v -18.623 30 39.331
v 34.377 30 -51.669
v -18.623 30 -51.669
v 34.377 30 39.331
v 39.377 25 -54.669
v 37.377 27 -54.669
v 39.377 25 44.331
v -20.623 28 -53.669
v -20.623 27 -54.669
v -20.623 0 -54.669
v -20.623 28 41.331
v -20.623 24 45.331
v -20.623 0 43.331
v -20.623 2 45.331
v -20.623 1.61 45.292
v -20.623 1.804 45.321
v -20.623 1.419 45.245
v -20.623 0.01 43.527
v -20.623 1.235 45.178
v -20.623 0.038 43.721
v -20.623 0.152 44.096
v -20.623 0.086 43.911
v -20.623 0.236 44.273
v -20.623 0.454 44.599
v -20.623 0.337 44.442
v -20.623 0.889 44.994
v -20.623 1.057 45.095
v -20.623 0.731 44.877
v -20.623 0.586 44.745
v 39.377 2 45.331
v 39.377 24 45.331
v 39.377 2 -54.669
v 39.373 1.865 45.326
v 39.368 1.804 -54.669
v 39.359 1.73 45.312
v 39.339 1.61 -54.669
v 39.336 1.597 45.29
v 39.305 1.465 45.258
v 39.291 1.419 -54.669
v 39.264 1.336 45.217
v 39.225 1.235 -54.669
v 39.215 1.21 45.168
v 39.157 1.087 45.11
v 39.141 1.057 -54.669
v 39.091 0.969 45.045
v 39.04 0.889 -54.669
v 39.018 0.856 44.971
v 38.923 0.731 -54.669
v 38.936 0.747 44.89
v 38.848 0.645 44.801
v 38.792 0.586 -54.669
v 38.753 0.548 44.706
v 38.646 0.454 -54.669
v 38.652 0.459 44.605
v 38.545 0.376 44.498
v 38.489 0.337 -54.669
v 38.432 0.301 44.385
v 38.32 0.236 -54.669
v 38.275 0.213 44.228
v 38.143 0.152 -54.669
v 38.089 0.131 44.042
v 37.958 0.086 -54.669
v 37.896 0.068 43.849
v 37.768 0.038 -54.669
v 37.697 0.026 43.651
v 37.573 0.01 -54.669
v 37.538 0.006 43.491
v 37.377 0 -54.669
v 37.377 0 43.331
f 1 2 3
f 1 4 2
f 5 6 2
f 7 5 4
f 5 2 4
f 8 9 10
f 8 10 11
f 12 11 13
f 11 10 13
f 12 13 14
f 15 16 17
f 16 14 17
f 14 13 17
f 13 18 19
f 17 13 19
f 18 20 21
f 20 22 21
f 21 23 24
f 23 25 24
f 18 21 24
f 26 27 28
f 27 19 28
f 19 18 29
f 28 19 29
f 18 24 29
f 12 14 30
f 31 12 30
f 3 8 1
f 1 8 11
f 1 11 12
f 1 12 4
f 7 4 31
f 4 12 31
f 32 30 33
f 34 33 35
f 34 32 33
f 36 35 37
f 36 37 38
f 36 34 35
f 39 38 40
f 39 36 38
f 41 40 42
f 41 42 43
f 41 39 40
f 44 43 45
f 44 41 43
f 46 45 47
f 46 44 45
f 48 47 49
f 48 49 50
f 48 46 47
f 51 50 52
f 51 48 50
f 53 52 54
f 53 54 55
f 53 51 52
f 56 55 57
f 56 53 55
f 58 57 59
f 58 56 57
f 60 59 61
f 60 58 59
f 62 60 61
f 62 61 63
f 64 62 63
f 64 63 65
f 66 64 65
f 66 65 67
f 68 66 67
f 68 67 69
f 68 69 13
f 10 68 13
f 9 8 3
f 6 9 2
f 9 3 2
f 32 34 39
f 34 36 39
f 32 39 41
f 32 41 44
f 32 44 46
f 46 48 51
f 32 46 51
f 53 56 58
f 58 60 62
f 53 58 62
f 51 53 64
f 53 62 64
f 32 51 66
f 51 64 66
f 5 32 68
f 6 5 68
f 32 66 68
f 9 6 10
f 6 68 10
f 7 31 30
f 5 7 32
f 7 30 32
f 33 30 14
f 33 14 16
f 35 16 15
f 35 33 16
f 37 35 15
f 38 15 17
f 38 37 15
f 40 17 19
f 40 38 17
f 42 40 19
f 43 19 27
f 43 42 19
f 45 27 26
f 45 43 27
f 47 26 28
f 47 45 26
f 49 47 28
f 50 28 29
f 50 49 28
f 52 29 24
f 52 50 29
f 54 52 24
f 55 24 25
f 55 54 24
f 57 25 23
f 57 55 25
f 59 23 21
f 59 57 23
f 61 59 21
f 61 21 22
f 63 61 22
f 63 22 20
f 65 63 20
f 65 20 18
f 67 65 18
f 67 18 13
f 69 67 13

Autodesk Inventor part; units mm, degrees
ref_plane "YZ Plane" through (0, 0, 0) normal (1, 0, 0) x (0, 1, 0)
ref_plane "XZ Plane" through (0, 0, 0) normal (0, 1, 0) x (-1, 0, 0)
ref_plane "XY Plane" through (0, 0, 0) normal (0, 0, 1) x (1, 0, 0)
sketch "Sketch1" plane through (0, 0, 0) normal (0, 1, 0) x (-1, 0, 0)
  line L0 (20.6226, 45.3307) -> (-39.3774, 45.3307)
  line L1 (-39.3774, 45.3307) -> (-39.3774, -54.6693)
  line L2 (-39.3774, -54.6693) -> (20.6226, -54.6693)
  line L3 (20.6226, -54.6693) -> (20.6226, 45.3307)
  point P0 (0, 0)
  dimension "d0" = 100
  dimension "d1" = 60
extrude "Extrusion1" add sketch "Sketch1" along normal blind 30
chamfer "Chamfer1" distance 5 angle 45 1 edges at (39.3774, 30, -4.6693)
chamfer "Chamfer2" distance 6 angle 45 1 edges at (6.8774, 30, 45.3307)
chamfer "Chamfer3" distance 3 angle 45 1 edges at (6.8774, 30, -54.6693)
chamfer "Chamfer4" distance 2 angle 45 1 edges at (-20.6226, 30, -6.1693)
fillet "Fillet1" radius 2 2 edges at (39.3774, 0, -4.6693) (9.3774, 0, 45.3307)
sketch "Sketch2" plane through (0, 30, 0) normal (0, 1, 0) x (1, 0, 0)
  line L0 (34.3774, 51.6693) -> (34.3774, -39.3307) projected
  line L1 (-18.6226, -39.3307) -> (-18.6226, 51.6693) projected
  line L2 (34.3774, -39.3307) -> (-18.6226, -39.3307) projected
  line L3 (-18.6226, 51.6693) -> (34.3774, 51.6693) projected
  point P0 (0, 0)
  dimension "d17" = 53
  dimension "d18" = 91
properties part number "stone" material "Rubber, Silicone"
